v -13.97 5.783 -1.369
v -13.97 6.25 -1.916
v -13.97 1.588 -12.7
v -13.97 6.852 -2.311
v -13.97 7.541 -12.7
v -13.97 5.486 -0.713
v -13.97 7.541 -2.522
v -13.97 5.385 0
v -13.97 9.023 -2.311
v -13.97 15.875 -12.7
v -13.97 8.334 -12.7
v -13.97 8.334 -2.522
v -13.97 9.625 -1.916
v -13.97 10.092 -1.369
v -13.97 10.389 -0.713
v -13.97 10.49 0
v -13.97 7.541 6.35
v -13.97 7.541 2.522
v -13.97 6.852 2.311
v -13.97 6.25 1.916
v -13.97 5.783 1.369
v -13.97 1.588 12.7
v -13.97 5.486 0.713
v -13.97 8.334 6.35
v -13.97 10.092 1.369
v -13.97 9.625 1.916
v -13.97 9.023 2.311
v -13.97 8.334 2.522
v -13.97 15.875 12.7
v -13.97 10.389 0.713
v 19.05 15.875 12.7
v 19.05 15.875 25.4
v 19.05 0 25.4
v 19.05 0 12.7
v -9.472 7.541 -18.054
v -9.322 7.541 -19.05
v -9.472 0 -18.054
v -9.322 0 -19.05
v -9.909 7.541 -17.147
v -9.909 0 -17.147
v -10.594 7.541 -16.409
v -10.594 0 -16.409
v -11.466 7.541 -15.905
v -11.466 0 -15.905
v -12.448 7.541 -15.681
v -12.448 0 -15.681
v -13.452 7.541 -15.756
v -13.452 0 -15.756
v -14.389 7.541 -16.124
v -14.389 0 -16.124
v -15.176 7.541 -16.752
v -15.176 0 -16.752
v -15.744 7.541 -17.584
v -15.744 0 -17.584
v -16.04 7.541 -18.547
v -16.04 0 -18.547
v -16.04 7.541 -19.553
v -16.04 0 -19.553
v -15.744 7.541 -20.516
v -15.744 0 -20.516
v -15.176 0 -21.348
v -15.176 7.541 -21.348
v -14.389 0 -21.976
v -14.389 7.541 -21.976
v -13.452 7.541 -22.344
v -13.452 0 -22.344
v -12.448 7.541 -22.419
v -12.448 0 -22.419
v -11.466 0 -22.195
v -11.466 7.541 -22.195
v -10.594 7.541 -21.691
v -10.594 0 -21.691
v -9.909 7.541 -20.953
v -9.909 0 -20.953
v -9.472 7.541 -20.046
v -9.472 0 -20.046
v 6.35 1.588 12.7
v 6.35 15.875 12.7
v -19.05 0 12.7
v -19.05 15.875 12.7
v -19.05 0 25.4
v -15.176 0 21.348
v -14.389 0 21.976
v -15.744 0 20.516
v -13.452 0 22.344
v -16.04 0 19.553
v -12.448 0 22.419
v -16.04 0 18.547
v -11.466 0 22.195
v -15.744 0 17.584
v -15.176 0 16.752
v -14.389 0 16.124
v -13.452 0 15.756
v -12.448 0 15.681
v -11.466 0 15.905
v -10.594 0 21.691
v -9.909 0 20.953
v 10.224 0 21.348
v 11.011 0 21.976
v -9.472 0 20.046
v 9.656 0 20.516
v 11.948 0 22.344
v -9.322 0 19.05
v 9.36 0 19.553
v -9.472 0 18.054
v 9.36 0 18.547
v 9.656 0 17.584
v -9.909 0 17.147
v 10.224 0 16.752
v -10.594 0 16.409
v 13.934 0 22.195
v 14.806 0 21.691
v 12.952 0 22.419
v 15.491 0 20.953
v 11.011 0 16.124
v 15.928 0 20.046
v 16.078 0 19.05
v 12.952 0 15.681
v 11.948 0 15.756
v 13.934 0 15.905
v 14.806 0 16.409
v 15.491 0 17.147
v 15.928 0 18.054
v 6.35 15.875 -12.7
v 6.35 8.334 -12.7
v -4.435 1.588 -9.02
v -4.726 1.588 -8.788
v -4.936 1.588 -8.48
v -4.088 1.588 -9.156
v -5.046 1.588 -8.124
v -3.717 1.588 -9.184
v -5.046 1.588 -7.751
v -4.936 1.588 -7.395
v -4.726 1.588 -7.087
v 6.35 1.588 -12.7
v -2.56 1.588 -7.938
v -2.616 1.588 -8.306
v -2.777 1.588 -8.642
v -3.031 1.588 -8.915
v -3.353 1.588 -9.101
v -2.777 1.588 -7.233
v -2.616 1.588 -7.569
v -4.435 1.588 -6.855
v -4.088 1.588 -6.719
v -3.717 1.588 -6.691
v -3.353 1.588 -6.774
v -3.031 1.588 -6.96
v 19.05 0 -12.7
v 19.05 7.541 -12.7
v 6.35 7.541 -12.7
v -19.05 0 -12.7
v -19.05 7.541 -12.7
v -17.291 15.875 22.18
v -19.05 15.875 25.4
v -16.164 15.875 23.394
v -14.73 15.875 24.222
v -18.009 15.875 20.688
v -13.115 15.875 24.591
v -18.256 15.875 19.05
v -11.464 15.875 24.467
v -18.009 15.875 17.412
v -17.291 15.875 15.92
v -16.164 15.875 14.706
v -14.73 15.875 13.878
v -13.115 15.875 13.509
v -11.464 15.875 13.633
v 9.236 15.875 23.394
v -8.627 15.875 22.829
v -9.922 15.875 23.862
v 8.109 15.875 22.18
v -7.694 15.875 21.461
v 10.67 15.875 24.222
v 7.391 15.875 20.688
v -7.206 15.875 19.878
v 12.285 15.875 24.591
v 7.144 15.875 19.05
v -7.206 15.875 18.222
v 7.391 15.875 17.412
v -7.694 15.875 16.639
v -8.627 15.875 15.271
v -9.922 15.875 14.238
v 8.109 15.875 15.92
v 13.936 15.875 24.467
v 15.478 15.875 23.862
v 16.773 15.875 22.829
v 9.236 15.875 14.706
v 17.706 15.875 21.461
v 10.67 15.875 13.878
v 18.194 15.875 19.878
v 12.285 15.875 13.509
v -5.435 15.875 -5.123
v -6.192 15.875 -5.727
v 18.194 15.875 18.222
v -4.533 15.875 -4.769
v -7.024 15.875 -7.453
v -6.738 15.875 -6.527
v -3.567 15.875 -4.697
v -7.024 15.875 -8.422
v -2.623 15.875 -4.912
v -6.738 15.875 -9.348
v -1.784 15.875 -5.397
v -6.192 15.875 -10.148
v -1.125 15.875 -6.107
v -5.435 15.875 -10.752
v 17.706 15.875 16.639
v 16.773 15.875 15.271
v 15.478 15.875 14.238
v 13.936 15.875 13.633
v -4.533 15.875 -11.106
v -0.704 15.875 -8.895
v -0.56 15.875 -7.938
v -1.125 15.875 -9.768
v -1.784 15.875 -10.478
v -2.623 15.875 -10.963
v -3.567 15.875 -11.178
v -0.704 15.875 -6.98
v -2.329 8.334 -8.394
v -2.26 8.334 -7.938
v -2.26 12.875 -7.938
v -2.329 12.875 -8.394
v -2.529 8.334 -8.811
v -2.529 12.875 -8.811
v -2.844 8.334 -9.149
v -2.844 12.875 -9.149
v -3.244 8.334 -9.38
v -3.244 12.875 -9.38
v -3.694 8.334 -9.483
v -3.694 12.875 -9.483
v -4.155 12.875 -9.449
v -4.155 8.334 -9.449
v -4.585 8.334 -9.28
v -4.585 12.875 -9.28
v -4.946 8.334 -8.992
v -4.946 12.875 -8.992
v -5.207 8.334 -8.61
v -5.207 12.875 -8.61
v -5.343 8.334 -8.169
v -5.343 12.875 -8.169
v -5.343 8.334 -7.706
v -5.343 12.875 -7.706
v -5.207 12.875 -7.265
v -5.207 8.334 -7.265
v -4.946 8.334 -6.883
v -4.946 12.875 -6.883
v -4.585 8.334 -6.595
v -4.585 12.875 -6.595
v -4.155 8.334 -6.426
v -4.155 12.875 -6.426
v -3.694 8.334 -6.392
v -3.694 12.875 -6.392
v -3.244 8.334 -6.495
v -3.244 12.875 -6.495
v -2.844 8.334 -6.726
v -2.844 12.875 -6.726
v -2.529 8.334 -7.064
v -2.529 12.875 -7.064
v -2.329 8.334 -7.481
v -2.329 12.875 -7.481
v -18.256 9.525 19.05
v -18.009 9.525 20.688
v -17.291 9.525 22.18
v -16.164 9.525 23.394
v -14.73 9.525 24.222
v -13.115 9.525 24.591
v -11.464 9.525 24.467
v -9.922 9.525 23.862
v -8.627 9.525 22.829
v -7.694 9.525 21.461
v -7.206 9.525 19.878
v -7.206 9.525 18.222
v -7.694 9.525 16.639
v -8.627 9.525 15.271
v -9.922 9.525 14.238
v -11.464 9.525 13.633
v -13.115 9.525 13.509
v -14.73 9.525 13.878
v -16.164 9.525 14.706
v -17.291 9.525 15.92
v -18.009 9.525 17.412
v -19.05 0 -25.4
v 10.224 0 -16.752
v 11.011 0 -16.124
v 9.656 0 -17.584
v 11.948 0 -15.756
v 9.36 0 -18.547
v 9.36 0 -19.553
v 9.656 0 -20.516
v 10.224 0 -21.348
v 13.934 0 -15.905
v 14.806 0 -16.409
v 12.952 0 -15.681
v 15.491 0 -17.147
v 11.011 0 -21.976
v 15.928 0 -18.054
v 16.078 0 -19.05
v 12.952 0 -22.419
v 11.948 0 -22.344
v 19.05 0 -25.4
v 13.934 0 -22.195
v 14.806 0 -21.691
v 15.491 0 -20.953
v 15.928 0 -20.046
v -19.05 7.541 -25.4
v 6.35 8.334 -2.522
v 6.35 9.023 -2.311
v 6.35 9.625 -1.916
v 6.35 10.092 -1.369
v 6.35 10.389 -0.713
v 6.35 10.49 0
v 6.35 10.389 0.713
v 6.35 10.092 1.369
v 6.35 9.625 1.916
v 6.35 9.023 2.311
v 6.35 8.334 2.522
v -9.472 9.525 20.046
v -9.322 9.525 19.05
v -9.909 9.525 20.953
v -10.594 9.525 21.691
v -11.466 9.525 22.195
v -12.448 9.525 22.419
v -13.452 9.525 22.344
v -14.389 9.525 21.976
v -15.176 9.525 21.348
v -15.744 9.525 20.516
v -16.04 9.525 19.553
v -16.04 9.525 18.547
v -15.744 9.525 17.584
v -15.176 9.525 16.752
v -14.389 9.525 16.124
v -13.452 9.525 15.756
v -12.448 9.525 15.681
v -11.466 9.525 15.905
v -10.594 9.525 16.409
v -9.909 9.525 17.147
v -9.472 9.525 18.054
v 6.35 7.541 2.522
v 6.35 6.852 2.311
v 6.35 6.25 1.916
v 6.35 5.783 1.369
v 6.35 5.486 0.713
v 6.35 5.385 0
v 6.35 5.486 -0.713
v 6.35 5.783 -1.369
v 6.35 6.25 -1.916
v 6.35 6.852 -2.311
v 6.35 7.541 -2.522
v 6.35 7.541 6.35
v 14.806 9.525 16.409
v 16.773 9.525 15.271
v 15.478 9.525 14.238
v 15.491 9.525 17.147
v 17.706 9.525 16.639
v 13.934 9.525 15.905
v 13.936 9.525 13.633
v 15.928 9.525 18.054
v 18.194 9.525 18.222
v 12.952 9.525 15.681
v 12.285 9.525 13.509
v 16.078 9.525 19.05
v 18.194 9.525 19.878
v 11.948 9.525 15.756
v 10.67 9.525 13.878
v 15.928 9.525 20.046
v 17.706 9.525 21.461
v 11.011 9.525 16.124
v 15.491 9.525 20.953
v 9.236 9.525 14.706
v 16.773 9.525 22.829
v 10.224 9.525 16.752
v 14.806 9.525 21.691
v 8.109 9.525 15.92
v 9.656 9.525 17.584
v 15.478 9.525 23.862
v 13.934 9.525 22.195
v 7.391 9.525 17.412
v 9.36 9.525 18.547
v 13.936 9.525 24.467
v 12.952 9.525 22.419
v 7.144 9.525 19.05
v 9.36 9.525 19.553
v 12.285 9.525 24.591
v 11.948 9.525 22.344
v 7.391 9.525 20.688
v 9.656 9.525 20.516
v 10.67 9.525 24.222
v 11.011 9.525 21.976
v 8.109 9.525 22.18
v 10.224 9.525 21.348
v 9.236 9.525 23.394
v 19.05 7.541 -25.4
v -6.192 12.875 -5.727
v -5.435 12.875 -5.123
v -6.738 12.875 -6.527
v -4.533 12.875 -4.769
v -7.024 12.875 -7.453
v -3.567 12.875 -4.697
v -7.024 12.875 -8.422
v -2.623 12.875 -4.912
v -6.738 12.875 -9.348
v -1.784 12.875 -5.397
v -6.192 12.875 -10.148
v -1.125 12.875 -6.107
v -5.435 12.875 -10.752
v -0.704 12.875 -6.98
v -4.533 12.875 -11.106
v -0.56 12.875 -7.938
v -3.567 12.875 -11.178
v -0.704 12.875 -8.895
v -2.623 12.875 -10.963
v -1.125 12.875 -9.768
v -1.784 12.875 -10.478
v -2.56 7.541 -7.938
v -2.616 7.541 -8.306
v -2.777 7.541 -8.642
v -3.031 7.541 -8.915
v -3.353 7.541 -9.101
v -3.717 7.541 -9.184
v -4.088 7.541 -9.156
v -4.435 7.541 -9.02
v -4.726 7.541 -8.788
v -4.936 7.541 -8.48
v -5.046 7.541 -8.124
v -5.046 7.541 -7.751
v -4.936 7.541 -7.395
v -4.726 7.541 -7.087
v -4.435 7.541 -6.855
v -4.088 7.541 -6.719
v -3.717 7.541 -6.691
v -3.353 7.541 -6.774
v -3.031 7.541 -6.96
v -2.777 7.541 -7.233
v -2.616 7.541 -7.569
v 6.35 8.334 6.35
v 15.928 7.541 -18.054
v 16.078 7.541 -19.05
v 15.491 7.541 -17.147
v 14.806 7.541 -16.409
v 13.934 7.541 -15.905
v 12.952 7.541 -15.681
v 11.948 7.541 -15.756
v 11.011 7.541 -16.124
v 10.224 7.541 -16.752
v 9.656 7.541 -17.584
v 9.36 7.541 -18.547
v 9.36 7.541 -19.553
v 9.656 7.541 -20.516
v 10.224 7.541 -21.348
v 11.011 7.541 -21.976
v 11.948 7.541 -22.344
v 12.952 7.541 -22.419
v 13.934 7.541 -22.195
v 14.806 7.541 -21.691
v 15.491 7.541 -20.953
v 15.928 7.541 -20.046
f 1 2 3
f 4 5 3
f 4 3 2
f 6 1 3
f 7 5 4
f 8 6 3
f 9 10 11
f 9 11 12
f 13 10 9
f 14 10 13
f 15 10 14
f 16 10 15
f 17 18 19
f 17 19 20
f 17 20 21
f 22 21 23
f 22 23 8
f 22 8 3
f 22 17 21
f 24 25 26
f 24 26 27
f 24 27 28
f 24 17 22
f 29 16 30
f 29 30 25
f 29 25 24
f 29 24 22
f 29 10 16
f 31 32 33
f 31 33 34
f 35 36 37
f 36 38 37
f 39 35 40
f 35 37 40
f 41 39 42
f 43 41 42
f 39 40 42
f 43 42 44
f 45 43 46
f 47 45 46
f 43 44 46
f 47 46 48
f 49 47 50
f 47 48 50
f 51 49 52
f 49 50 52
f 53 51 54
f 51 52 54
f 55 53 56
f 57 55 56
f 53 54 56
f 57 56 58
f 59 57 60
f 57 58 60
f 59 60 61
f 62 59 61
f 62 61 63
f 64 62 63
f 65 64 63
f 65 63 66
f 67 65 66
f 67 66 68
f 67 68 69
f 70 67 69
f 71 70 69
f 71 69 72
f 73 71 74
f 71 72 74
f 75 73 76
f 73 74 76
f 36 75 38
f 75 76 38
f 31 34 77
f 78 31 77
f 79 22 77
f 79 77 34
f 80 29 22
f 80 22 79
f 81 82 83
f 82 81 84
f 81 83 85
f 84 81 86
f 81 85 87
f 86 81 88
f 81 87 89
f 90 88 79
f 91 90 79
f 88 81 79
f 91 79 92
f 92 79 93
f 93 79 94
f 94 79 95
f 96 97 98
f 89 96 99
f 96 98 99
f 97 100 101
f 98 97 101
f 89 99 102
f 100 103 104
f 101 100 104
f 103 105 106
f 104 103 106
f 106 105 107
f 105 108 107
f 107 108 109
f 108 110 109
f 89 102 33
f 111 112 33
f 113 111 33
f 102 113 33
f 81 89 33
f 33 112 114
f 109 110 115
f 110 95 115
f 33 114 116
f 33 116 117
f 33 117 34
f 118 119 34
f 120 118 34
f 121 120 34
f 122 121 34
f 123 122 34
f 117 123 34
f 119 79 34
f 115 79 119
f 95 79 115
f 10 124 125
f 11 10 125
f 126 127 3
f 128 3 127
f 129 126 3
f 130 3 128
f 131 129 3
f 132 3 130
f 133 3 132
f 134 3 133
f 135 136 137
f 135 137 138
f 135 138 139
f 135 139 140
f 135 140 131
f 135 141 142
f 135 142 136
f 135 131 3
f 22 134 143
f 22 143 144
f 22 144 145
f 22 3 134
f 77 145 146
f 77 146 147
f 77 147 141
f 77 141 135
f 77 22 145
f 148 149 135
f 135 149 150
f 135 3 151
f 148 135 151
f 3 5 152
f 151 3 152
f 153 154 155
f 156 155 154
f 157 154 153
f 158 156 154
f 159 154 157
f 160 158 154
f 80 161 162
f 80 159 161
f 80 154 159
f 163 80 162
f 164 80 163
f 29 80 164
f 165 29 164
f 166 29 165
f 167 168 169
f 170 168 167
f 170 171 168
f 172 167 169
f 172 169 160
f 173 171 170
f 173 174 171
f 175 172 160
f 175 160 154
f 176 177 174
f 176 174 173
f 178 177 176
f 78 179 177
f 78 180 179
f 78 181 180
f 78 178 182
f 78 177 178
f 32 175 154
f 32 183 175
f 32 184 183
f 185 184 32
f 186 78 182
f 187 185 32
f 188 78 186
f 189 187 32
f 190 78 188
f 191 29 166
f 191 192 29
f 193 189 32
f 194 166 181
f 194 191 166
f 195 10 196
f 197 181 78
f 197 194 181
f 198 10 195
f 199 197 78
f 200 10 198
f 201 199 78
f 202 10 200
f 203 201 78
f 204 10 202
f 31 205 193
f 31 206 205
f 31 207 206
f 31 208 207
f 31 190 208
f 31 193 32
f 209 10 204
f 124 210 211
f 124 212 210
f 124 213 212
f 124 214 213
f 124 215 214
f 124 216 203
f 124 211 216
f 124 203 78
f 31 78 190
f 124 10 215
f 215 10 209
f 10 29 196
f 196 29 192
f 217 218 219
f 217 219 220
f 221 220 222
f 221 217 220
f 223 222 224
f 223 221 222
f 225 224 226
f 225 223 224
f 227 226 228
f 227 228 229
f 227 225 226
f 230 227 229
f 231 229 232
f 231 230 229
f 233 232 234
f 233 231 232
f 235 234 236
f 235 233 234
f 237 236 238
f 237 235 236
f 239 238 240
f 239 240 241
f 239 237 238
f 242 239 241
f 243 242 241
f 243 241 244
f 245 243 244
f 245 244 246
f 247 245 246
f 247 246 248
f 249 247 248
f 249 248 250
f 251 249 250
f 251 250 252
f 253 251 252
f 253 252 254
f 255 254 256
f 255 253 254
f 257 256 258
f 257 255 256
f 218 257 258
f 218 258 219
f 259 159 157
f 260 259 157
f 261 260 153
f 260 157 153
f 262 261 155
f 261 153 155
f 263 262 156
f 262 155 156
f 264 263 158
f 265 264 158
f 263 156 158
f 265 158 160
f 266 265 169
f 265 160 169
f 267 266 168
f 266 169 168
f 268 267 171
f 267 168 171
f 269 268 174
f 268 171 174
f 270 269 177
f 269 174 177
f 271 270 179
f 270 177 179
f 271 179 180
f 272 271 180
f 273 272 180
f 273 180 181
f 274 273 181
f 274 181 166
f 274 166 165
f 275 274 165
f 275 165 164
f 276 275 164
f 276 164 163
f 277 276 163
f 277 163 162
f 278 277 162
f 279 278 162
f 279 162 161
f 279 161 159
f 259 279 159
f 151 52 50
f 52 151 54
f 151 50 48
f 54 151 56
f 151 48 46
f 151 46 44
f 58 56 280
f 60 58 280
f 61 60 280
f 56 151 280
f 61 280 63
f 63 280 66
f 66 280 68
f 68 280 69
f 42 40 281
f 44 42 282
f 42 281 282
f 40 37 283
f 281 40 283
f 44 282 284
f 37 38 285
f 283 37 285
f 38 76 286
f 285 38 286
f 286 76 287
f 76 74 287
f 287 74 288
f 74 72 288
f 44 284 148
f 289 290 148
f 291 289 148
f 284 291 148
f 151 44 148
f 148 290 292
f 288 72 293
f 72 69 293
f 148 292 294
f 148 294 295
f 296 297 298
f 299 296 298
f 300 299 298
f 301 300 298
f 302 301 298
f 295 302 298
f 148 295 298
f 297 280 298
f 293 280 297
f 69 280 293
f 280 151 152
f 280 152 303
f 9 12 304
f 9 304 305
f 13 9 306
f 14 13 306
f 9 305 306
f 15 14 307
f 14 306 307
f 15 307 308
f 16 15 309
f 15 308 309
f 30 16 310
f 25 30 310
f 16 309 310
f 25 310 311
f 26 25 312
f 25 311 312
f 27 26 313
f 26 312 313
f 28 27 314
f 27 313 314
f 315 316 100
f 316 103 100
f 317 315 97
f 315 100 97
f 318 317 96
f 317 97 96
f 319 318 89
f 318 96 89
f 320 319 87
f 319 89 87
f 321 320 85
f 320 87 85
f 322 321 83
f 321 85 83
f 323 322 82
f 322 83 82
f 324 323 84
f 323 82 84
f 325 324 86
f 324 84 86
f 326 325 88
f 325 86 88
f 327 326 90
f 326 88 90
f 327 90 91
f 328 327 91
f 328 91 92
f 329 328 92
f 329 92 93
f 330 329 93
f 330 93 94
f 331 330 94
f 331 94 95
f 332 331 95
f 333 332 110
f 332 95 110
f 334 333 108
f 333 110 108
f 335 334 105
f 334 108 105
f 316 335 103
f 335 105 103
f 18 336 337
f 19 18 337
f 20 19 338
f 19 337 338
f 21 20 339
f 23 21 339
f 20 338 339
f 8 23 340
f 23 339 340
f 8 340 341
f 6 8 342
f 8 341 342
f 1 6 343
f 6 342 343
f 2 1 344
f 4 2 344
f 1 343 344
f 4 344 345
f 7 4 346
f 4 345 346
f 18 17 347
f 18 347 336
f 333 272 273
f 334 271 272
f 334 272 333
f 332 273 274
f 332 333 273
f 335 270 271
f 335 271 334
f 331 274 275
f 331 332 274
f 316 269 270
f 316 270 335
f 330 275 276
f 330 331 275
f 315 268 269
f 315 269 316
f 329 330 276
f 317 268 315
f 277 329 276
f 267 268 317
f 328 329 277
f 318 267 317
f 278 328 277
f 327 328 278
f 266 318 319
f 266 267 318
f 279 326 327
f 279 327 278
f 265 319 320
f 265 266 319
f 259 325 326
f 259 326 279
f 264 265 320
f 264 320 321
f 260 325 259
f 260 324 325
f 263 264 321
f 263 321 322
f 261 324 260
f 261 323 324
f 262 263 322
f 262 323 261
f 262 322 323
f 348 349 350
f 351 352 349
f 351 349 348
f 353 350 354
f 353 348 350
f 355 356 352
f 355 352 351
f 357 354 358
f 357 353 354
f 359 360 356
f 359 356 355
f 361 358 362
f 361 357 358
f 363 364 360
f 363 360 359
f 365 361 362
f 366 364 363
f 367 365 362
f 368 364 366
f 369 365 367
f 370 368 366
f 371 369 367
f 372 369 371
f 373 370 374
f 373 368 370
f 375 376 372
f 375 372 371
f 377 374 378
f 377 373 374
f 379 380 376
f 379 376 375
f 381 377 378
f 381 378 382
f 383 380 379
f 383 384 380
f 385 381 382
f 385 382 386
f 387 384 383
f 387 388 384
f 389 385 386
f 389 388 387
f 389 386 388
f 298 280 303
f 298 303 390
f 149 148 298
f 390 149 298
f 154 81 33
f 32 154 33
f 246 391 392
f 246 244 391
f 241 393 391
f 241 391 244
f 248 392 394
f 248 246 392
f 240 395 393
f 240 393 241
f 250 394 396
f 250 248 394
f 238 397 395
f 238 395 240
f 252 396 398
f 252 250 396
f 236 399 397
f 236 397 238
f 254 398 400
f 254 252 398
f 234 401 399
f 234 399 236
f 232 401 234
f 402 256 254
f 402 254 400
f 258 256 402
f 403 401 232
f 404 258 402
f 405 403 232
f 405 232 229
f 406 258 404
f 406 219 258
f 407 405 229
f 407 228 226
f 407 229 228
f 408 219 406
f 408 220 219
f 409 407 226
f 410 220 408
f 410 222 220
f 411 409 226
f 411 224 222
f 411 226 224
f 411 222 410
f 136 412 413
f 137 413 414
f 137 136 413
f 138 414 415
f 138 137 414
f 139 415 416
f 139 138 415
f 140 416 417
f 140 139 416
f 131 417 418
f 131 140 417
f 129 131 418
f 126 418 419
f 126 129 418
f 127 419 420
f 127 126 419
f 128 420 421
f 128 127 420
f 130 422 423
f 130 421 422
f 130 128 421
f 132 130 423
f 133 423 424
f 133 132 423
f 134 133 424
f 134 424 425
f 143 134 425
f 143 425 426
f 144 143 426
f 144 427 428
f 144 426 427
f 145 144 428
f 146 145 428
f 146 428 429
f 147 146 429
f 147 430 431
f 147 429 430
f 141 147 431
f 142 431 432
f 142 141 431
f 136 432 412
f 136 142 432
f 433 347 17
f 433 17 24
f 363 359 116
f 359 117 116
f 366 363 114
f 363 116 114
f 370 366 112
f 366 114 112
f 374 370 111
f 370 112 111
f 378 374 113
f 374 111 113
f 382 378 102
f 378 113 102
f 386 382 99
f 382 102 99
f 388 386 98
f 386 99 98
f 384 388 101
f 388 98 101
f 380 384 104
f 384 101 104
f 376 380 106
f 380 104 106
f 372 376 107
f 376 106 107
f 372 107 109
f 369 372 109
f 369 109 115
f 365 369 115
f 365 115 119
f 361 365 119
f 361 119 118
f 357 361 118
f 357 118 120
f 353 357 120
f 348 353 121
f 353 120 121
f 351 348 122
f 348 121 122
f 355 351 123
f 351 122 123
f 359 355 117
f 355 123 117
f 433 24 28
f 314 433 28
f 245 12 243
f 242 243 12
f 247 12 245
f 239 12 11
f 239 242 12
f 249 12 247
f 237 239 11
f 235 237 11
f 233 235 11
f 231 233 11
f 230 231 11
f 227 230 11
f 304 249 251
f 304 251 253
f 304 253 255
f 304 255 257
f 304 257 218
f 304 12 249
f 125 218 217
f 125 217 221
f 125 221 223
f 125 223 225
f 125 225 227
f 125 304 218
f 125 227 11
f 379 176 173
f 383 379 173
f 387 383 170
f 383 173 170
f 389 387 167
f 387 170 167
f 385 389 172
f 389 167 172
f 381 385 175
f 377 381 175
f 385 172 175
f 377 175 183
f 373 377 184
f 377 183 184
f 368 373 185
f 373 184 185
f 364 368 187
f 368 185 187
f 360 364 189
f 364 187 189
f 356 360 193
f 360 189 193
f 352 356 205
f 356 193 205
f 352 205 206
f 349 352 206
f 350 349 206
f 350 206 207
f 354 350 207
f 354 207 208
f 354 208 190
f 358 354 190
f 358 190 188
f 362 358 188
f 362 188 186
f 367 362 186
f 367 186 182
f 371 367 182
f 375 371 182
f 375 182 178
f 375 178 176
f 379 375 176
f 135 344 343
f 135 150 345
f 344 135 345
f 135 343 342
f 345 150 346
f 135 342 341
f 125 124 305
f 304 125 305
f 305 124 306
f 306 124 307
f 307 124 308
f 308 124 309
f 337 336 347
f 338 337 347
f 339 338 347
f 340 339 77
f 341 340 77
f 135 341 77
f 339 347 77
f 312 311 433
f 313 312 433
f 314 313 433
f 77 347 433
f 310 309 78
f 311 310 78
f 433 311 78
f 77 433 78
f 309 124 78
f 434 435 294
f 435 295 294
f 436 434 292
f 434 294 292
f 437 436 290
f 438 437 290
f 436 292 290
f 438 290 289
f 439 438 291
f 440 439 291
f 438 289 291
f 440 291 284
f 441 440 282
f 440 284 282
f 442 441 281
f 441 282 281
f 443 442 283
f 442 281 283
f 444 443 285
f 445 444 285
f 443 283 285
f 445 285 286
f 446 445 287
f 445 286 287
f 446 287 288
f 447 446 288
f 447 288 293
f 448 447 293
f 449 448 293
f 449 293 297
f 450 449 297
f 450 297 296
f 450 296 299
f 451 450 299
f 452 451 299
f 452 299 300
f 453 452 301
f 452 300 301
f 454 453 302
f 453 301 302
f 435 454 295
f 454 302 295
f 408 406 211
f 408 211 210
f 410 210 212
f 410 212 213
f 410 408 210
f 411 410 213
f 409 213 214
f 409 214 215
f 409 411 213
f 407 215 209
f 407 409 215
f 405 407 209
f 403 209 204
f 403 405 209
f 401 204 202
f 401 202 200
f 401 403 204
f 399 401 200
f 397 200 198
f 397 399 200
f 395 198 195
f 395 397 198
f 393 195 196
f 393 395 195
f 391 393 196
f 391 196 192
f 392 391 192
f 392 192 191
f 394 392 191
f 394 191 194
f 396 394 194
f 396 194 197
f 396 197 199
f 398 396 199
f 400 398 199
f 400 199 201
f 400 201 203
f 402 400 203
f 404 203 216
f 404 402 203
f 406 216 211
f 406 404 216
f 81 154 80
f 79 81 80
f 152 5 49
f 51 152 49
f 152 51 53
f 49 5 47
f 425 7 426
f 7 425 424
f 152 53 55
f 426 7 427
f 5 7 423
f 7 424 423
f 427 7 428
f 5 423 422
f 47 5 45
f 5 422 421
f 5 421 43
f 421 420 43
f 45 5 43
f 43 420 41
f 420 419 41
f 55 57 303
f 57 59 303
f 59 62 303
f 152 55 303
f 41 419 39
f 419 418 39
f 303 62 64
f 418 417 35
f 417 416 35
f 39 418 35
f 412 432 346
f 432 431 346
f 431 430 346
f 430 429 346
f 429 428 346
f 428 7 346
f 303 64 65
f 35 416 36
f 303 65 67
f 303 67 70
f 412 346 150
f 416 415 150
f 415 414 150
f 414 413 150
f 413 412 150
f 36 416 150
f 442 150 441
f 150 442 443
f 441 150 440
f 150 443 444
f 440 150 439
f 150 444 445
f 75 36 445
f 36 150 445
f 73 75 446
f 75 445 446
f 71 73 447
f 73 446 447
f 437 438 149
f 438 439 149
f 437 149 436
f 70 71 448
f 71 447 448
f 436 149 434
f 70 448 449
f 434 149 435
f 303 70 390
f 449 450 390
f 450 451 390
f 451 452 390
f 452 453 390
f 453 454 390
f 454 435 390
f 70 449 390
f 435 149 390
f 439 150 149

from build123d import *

# Parameters (mm, degrees)
SKETCH1_W                                        = 38.1
SKETCH1_H                                        = 50.8
EXTRUDE1_DEPTH                                   = 15.875
CBORE_FOR_1_4_SOCKET_HEAD_CAP_SCREW1_D           = 6.7564
CBORE_FOR_1_4_SOCKET_HEAD_CAP_SCREW1_CBORE_D     = 11.1125
CBORE_FOR_1_4_SOCKET_HEAD_CAP_SCREW1_CBORE_DEPTH = 6.35
SKETCH3_W                                        = 5.08
SKETCH3_H                                        = 25.4
SKETCH3_W_2                                      = 12.7
CUT_EXTRUDE2_DEPTH                               = 36.497579143
SKETCH5_W                                        = 20.32
SKETCH5_H                                        = 25.4
CUT_EXTRUDE4_DEPTH                               = 1.5875
F_1_4_20_TAPPED_HOLE1_D                          = 5.1054
SKETCH11_W                                       = 19.05
SKETCH11_H                                       = 0.79375
CUT_EXTRUDE5_DEPTH                               = 49.464271634
ADVANCEDHOLE1_START                              = 12.875
ADVANCEDHOLE1_OUTLINE_R                          = 3.25
ADVANCEDHOLE1_DEPTH                              = 3
ADVANCEDHOLE1_START_2                            = 1.5875
ADVANCEDHOLE1_2_OUTLINE_R                        = 1.25
ADVANCEDHOLE1_2_DEPTH                            = 11.2875
ADVANCEDHOLE1_START_3                            = 8.334375
ADVANCEDHOLE1_3_OUTLINE_R                        = 1.55
ADVANCEDHOLE1_3_OUTLINE_R_2                      = 1.25
ADVANCEDHOLE1_3_DEPTH                            = 4.540625


# Read off the part's stored shape, not the designer's step: AdvancedHole1
with BuildPart() as part:
    # Sketch1 → Extrude1 (new body)
    with BuildSketch(Plane(origin=(0, 0, 0), x_dir=(1, 0, 0), z_dir=(0, 1, 0))):
        Rectangle(SKETCH1_W, SKETCH1_H)
    extrude(amount=EXTRUDE1_DEPTH)

    # CBORE for 1/4 Socket Head Cap Screw1 (through all)
    with Locations(Plane(origin=(0, 15.875, 0), x_dir=(-1, 0, 0), z_dir=(0, 1, 0))):
        with Locations((12.7, -19.05), (-12.7, -19.05), (-12.7, 19.05), (12.7, 19.05)):
            CounterBoreHole(CBORE_FOR_1_4_SOCKET_HEAD_CAP_SCREW1_D / 2, CBORE_FOR_1_4_SOCKET_HEAD_CAP_SCREW1_CBORE_D / 2, CBORE_FOR_1_4_SOCKET_HEAD_CAP_SCREW1_CBORE_DEPTH)

    # Sketch3 → Cut-Extrude2 (cut, through all)
    with BuildSketch(Plane(origin=(0, 15.875, 0), x_dir=(-1, 0, 0), z_dir=(0, 1, 0))):
        with Locations((16.51, 0)):
            Rectangle(SKETCH3_W, SKETCH3_H)
        with Locations((-12.7, 0)):
            Rectangle(SKETCH3_W_2, SKETCH3_H)
    extrude(amount=-CUT_EXTRUDE2_DEPTH, mode=Mode.SUBTRACT)

    # Sketch5 → Cut-Extrude4 (cut)
    with BuildSketch(Plane.XZ):
        with Locations((-3.81, 0)):
            Rectangle(SKETCH5_W, SKETCH5_H)
    extrude(amount=-CUT_EXTRUDE4_DEPTH, mode=Mode.SUBTRACT)

    # 1/4-20 Tapped Hole1 (through all)
    with Locations(Plane.ZY.offset(13.97)):
        with Locations((0, 7.9375)):
            Hole(F_1_4_20_TAPPED_HOLE1_D / 2)

    # Sketch11 → Cut-Extrude5 (cut, through all)
    with BuildSketch(Plane(origin=(19.05, 0, 0), x_dir=(0, 0, -1), z_dir=(1, 0, 0))):
        Polygon((25.4, 7.540625), (25.4, 15.875), (12.7, 15.875), (12.7, 8.334375), (12.7, 7.540625), align=None)
        with Locations((3.175, 7.9375)):
            Rectangle(SKETCH11_W, SKETCH11_H)
    extrude(amount=-CUT_EXTRUDE5_DEPTH, mode=Mode.SUBTRACT)

    # AdvancedHole1 outline → AdvancedHole1 (cut)
    with BuildSketch(Plane(origin=(0, 0, 0), x_dir=(1, 0, 0), z_dir=(0, 1, 0)).offset(ADVANCEDHOLE1_START)):
        with Locations((-3.81, 7.9375)):
            Circle(ADVANCEDHOLE1_OUTLINE_R)
    extrude(amount=ADVANCEDHOLE1_DEPTH, mode=Mode.SUBTRACT)

    # AdvancedHole1 2 outline → AdvancedHole1 2 (cut)
    with BuildSketch(Plane(origin=(0, 0, 0), x_dir=(1, 0, 0), z_dir=(0, 1, 0)).offset(ADVANCEDHOLE1_START_2)):
        with Locations((-3.81, 7.9375)):
            Circle(ADVANCEDHOLE1_2_OUTLINE_R)
    extrude(amount=ADVANCEDHOLE1_2_DEPTH, mode=Mode.SUBTRACT)

    # AdvancedHole1 3 outline → AdvancedHole1 3 (cut)
    with BuildSketch(Plane(origin=(0, 0, 0), x_dir=(1, 0, 0), z_dir=(0, 1, 0)).offset(ADVANCEDHOLE1_START_3)):
        with Locations((-3.81, 7.9375)):
            Circle(ADVANCEDHOLE1_3_OUTLINE_R)
        with Locations((-3.81, 7.9375)):
            Circle(ADVANCEDHOLE1_3_OUTLINE_R_2, mode=Mode.SUBTRACT)
    extrude(amount=ADVANCEDHOLE1_3_DEPTH, mode=Mode.SUBTRACT)


solid = part.part
